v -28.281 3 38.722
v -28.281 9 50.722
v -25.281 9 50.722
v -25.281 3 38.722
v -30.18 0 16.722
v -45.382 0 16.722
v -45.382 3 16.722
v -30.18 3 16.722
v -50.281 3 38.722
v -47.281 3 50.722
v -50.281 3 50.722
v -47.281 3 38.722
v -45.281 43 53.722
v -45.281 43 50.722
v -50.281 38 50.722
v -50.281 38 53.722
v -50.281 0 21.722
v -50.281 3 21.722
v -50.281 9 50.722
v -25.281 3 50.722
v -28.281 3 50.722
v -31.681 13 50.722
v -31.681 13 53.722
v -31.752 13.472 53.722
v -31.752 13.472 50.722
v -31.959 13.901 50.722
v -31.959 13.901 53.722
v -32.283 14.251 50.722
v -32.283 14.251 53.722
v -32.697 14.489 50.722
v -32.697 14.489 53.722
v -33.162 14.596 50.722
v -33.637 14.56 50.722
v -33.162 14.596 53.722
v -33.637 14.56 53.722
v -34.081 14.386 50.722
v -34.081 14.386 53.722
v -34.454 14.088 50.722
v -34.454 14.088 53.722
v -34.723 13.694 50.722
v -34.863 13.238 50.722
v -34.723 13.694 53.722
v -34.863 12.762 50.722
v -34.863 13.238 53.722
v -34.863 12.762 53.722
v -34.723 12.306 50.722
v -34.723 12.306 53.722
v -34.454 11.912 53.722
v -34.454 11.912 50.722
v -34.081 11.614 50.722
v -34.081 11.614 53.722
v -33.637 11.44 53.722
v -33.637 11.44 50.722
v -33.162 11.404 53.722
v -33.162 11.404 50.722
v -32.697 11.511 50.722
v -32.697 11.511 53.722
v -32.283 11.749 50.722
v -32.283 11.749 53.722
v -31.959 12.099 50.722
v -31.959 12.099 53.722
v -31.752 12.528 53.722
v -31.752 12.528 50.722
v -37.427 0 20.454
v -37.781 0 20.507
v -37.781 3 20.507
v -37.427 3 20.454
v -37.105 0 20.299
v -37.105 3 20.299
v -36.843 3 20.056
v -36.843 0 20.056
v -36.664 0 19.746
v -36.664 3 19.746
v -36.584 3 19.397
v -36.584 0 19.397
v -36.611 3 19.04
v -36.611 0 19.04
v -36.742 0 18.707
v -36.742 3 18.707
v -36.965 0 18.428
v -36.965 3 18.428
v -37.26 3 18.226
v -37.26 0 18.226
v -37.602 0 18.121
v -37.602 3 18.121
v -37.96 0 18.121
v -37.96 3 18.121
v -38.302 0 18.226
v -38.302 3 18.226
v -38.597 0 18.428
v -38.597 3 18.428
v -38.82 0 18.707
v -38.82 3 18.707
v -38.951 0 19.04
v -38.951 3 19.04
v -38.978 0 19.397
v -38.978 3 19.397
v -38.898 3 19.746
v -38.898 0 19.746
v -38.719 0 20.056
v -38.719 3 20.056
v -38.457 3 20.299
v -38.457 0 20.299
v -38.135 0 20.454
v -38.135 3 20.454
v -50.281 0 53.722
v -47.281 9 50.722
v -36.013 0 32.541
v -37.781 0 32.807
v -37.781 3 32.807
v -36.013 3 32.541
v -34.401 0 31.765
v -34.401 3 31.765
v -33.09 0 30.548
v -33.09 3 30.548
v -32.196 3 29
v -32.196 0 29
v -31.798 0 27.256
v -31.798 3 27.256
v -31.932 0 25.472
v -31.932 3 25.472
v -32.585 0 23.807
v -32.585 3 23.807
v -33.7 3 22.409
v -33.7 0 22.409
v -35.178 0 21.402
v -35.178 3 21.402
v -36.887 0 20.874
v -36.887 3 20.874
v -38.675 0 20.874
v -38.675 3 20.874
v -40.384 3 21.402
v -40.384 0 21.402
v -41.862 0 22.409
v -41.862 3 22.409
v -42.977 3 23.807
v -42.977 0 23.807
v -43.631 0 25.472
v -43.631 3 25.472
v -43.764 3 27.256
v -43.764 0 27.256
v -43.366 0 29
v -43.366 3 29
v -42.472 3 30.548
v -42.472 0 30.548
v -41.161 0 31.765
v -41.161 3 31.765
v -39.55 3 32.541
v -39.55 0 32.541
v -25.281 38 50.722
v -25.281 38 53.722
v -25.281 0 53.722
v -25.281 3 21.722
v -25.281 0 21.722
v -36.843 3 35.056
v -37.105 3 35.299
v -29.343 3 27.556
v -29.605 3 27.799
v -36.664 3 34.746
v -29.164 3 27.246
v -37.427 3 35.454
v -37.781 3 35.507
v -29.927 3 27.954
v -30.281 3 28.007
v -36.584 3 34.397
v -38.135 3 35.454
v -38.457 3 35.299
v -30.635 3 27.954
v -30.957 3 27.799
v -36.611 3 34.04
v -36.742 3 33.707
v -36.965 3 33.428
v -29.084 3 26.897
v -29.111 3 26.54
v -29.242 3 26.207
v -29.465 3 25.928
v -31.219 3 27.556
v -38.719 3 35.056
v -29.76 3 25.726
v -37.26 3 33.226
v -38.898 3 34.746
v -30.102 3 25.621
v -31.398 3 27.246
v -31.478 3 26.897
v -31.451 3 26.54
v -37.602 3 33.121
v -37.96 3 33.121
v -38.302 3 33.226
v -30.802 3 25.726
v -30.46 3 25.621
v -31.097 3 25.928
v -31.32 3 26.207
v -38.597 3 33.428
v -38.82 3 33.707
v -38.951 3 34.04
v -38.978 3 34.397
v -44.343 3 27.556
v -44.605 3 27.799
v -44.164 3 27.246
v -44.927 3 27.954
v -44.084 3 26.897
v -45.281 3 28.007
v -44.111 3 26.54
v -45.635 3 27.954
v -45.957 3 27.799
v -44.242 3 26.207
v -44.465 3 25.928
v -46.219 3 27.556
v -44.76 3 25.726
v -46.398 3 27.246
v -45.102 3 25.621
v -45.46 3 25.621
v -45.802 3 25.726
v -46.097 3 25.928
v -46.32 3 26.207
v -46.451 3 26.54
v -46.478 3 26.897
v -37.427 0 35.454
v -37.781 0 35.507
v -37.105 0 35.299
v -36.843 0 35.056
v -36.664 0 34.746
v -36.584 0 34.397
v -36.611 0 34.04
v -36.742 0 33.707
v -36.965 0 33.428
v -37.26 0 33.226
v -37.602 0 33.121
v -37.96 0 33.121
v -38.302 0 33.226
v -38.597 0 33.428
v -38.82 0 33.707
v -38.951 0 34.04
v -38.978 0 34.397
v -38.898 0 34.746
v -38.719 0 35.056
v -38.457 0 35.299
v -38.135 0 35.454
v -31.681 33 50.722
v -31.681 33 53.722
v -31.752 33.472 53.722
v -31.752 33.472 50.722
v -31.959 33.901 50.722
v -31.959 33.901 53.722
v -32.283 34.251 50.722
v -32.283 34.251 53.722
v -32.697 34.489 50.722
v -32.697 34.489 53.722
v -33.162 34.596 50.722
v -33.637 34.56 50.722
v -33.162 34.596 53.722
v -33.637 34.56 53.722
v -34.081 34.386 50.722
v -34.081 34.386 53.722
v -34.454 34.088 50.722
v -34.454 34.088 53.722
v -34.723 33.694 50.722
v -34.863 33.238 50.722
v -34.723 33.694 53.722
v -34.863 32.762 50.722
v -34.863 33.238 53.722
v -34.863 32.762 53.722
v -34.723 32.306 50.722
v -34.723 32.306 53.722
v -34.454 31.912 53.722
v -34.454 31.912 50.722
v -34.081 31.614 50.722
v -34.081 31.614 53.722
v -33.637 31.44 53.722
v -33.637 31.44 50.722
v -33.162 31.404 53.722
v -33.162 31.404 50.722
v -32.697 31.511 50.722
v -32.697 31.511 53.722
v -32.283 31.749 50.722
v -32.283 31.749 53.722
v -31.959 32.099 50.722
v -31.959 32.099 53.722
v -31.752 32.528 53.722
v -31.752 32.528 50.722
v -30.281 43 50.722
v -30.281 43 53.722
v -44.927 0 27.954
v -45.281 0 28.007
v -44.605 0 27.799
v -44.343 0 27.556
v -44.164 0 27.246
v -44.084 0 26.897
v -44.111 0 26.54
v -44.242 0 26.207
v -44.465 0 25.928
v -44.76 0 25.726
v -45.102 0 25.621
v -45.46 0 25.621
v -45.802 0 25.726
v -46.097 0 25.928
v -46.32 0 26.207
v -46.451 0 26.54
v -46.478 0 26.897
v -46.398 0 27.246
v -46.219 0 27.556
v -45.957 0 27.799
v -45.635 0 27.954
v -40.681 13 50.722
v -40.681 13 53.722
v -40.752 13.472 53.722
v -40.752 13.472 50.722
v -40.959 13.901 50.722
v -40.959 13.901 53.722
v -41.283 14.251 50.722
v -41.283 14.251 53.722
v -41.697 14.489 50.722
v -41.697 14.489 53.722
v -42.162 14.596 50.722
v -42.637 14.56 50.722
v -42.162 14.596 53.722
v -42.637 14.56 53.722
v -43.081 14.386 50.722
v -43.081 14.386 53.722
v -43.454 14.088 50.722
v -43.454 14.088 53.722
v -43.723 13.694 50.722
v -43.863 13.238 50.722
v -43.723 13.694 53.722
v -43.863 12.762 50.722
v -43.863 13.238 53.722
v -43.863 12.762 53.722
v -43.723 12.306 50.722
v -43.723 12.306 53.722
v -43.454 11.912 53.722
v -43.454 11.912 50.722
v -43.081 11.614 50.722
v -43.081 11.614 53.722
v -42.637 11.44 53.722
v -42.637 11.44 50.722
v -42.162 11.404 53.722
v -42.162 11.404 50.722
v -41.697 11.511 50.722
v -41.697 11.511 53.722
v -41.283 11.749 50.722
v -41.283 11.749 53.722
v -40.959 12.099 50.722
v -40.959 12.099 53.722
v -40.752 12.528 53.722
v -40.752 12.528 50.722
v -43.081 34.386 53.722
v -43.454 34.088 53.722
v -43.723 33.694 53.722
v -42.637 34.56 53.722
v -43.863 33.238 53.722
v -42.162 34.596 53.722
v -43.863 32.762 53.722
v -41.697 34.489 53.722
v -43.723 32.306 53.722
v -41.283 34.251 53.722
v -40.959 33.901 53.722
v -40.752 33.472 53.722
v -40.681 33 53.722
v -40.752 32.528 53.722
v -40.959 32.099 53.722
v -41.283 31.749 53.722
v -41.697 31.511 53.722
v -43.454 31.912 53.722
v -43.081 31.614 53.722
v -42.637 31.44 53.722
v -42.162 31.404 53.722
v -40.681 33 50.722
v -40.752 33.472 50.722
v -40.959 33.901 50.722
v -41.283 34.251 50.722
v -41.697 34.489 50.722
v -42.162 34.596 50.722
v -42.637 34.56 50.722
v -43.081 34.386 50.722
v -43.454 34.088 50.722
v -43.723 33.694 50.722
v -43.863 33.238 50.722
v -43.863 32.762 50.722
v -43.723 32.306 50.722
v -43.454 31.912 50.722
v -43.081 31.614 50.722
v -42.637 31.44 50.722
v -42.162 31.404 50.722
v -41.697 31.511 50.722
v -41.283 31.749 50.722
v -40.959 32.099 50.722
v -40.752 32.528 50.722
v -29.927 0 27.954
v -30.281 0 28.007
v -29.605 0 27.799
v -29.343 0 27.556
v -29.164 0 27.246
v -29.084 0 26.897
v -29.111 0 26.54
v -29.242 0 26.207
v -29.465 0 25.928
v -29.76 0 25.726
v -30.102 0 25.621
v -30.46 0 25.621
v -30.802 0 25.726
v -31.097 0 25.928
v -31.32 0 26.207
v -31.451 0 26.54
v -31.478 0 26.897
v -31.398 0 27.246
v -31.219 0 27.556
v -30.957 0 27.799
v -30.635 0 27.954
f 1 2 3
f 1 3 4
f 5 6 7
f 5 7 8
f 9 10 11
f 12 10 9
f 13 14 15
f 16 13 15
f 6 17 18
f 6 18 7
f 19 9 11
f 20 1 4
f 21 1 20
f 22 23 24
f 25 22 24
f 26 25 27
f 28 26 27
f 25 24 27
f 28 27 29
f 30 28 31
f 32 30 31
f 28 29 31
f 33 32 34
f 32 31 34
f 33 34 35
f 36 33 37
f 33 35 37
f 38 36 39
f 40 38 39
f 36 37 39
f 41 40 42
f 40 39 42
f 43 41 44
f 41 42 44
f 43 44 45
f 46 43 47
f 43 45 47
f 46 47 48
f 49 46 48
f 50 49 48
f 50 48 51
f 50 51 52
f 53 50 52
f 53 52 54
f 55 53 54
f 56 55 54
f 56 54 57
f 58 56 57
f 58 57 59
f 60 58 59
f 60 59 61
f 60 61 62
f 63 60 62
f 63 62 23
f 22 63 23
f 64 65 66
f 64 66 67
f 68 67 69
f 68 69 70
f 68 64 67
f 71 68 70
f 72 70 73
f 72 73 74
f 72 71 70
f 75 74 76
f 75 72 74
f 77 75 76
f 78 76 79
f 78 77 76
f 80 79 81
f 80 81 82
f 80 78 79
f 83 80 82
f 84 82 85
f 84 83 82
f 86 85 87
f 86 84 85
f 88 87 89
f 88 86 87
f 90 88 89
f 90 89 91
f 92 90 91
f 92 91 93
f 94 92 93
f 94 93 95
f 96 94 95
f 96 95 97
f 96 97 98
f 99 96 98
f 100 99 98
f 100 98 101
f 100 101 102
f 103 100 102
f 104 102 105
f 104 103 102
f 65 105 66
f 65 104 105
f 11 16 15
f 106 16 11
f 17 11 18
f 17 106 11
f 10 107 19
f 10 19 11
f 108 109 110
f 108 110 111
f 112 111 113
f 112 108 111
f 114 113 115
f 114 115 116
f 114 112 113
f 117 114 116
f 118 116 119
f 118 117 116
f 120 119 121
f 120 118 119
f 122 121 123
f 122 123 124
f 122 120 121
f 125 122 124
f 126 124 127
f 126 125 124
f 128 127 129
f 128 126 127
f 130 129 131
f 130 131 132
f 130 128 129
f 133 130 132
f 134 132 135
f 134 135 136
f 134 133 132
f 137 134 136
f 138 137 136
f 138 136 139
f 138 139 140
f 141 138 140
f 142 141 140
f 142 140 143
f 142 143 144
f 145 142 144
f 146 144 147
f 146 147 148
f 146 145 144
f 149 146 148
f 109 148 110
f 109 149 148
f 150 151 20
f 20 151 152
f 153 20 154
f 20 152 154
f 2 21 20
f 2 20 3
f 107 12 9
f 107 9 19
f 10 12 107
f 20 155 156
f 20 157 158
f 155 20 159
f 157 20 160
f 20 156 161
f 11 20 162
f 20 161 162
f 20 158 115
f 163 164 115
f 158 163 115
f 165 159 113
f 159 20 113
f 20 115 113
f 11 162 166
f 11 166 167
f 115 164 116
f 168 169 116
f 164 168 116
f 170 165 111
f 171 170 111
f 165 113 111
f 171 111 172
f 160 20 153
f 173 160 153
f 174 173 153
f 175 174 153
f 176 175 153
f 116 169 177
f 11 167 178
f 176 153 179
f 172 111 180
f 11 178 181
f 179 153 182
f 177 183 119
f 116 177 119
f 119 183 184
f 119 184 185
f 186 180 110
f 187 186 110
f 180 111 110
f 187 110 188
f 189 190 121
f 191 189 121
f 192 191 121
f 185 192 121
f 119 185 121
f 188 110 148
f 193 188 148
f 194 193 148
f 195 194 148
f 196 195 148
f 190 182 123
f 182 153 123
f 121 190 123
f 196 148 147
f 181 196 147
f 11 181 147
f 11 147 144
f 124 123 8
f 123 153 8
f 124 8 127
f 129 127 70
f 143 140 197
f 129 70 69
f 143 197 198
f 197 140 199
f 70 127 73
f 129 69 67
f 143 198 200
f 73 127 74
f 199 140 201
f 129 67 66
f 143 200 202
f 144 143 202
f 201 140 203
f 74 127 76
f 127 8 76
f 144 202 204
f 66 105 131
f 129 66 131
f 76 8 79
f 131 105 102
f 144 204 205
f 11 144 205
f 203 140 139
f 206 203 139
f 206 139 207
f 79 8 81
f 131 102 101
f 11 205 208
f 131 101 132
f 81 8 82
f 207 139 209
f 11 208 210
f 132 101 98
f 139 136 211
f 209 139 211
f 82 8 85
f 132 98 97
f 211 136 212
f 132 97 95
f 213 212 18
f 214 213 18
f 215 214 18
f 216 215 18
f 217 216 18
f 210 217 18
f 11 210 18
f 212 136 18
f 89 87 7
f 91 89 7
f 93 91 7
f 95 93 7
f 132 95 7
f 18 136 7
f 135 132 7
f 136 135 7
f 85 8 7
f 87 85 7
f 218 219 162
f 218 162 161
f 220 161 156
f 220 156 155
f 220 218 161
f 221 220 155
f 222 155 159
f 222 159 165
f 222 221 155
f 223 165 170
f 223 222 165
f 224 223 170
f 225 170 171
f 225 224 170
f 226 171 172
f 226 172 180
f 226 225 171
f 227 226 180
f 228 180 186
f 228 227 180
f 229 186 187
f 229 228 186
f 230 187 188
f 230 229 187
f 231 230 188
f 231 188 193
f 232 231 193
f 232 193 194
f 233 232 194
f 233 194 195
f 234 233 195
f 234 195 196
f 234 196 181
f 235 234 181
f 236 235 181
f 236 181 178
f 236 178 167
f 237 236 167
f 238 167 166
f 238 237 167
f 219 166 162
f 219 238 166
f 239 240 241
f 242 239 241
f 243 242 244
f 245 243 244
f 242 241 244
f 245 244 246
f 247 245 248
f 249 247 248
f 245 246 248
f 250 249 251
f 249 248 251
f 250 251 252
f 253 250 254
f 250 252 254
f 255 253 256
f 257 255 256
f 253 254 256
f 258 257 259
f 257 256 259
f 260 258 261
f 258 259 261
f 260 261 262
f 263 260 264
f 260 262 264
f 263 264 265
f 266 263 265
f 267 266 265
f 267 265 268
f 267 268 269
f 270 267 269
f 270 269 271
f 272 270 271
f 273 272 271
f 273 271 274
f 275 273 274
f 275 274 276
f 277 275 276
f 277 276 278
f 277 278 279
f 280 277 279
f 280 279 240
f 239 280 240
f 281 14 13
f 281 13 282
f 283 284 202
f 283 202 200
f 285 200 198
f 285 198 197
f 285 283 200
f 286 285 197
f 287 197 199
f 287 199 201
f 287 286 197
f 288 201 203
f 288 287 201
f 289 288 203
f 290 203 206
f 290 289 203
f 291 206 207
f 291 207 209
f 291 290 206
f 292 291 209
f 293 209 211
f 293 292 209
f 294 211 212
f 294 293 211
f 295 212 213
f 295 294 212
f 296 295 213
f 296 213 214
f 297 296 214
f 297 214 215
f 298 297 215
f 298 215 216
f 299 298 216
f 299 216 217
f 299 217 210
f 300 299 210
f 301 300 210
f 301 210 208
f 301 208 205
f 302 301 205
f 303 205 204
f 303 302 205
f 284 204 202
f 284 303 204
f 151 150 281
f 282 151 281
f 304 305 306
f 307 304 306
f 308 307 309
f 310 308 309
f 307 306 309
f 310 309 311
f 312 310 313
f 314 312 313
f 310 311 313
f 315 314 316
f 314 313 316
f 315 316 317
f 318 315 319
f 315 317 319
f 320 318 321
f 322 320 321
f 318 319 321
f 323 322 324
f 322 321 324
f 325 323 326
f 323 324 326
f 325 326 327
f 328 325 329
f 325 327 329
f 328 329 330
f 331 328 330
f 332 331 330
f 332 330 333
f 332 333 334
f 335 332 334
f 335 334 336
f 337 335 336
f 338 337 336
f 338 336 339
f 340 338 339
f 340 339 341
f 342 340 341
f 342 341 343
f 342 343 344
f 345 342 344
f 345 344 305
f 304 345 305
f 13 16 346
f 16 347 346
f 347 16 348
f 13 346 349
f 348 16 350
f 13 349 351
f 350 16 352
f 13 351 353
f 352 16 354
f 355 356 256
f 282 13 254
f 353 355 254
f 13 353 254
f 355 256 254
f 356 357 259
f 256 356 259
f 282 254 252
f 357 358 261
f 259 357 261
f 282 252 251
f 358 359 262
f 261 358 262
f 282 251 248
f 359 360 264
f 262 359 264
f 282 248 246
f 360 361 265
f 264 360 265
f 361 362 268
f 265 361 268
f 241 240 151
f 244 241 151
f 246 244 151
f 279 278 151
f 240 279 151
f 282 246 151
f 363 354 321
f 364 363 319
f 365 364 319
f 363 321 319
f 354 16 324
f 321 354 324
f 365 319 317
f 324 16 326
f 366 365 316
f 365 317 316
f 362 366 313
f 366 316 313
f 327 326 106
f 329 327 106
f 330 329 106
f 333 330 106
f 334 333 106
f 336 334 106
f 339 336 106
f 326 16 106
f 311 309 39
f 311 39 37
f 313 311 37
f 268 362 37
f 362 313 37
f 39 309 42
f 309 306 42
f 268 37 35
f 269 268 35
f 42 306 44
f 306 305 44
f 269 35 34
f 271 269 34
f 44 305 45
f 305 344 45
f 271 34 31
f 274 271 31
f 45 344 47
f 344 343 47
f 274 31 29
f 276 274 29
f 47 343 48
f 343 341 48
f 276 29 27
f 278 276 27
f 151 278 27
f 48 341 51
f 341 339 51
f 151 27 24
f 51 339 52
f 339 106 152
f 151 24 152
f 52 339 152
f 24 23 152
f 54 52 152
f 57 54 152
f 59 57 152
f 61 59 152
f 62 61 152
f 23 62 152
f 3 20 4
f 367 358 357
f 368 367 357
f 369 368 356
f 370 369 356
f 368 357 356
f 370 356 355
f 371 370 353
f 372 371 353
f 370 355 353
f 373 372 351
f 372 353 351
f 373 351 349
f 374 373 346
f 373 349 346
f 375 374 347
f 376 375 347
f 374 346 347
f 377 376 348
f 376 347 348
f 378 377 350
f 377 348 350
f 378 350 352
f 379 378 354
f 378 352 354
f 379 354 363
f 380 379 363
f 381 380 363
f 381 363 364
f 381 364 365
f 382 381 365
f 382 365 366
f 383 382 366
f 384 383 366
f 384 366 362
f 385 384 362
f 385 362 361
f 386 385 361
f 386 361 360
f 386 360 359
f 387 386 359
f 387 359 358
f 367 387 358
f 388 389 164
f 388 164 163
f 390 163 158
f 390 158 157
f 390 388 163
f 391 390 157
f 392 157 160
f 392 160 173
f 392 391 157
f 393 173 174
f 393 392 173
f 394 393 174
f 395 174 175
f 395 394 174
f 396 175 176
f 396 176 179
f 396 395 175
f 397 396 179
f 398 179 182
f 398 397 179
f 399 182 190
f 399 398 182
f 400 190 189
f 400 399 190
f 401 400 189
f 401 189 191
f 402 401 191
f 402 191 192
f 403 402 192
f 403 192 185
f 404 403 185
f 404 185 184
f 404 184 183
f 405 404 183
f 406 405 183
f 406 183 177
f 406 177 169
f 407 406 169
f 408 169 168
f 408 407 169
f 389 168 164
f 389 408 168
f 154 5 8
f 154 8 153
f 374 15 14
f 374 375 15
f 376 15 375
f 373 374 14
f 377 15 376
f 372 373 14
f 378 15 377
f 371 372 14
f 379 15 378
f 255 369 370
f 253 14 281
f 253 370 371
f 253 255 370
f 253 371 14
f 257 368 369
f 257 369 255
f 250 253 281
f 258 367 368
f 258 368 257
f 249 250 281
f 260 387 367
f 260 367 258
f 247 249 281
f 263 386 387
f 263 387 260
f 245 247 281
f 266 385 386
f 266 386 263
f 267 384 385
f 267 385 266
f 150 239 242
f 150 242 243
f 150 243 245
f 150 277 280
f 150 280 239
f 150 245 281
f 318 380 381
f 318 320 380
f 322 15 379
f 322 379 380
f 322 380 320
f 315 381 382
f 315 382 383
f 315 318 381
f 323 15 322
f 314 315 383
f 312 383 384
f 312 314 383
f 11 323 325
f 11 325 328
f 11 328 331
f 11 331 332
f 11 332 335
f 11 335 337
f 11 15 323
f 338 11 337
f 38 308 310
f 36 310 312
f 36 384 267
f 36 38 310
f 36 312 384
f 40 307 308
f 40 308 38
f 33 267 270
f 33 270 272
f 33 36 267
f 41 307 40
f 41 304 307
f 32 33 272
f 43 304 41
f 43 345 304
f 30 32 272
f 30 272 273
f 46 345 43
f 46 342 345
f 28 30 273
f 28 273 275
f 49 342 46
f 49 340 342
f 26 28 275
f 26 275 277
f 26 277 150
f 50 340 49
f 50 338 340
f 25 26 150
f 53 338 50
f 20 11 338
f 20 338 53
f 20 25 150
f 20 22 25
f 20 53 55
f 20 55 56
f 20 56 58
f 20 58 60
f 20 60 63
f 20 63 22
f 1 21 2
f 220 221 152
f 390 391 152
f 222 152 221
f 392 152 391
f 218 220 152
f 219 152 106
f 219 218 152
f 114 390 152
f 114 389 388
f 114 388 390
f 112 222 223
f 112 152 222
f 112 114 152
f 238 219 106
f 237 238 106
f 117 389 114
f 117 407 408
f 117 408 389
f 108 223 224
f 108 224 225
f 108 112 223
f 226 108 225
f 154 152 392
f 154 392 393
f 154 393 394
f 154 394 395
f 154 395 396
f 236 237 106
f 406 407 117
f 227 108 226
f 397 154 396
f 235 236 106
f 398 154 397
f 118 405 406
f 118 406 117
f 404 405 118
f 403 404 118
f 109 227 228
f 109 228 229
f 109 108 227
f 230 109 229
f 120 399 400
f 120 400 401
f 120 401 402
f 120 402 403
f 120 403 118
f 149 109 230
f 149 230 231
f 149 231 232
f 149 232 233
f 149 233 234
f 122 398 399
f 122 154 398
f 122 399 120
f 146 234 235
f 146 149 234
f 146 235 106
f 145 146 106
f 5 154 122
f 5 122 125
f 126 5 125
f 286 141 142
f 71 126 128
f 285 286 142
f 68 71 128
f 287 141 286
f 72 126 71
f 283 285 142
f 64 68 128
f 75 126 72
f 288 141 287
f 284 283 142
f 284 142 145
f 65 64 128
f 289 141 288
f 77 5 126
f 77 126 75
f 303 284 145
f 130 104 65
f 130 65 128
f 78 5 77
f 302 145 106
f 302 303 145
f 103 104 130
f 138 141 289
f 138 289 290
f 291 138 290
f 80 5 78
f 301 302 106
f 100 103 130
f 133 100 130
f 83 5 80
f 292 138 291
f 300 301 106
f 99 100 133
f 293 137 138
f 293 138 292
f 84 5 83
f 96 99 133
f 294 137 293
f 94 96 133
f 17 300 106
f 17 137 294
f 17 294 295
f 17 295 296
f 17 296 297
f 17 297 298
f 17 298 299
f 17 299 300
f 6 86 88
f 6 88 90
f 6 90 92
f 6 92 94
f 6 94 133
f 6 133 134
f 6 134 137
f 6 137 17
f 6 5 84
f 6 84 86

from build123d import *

# Parameters (mm, degrees)
SKETCH2_R                      = 6
SKETCH2_R_2                    = 1.2
BOSS_EXTRUDE1_DEPTH            = 3
SKETCH4_W                      = 25
SKETCH4_H                      = 3
BOSS_EXTRUDE2_DEPTH            = 40
CUT_EXTRUDE1_DEPTH             = 8
F_3_2_3_2_DIAMETER_HOLE1_D     = 3.2
F_3_2_3_2_DIAMETER_HOLE1_DEPTH = 3.2
F_3_2_3_2_DIAMETER_HOLE1_TIP   = 0.96137699
GUSSET1_THICKNESS              = 3
GUSSET2_THICKNESS              = 3


with BuildPart() as part:
    # Sketch2 → Boss-Extrude1 (new body)
    with BuildSketch(Plane(origin=(0, 0, 0), x_dir=(1, 0, 0), z_dir=(0, 1, 0))):
        Polygon((-25.281070854, -53.721991781), (-50.281070854, -53.721991781), (-50.281070854, -21.721991781), (-45.382091368, -16.721991781), (-30.180050339, -16.721991781), (-25.281070854, -21.721991781), align=None)
        with Locations(Location((-37.781070854, -26.807484951, 0), (0, 0, 270))):
            Circle(SKETCH2_R, mode=Mode.SUBTRACT)
        with Locations(Location((-37.781070854, -19.307484951, 0), (0, 0, 270))):
            Circle(SKETCH2_R_2, mode=Mode.SUBTRACT)
        with Locations(Location((-45.281070854, -26.807484951, 0), (0, 0, 270))):
            Circle(SKETCH2_R_2, mode=Mode.SUBTRACT)
        with Locations(Location((-37.781070854, -34.307484951, 0), (0, 0, 270))):
            Circle(SKETCH2_R_2, mode=Mode.SUBTRACT)
        with Locations(Location((-30.281070854, -26.807484951, 0), (0, 0, 270))):
            Circle(SKETCH2_R_2, mode=Mode.SUBTRACT)
    extrude(amount=BOSS_EXTRUDE1_DEPTH)

    # Sketch4 → Boss-Extrude2 (add)
    with BuildSketch(Plane(origin=(0, 3, 0), x_dir=(1, 0, 0), z_dir=(0, 1, 0))):
        with Locations((-37.781070854, -52.221991781)):
            Rectangle(SKETCH4_W, SKETCH4_H)
    extrude(amount=BOSS_EXTRUDE2_DEPTH)

    # Sketch5 → Cut-Extrude1 (cut)
    with BuildSketch(Plane(origin=(0, 0, 50.721991781), x_dir=(-1, 0, 0), z_dir=(0, 0, -1))):
        Polygon((25.281070854, 43), (25.281070854, 38), (30.281070854, 43), align=None)
        Polygon((50.281070854, 43), (45.281070854, 43), (50.281070854, 38), align=None)
    extrude(amount=-CUT_EXTRUDE1_DEPTH, mode=Mode.SUBTRACT)

    # Ø3.2 (3.2) Diameter Hole1
    with Locations(Plane(origin=(0, 0, 50.721991781), x_dir=(-1, 0, 0), z_dir=(0, 0, -1))):
        with Locations((33.281070854, 33), (42.281070854, 33), (42.281070854, 13), (33.281070854, 13)):
            Hole(F_3_2_3_2_DIAMETER_HOLE1_D / 2, depth=F_3_2_3_2_DIAMETER_HOLE1_DEPTH)
            with Locations((0, 0, -(F_3_2_3_2_DIAMETER_HOLE1_DEPTH + F_3_2_3_2_DIAMETER_HOLE1_TIP / 2))):  # 118° drill point
                Cone(0, F_3_2_3_2_DIAMETER_HOLE1_D / 2, F_3_2_3_2_DIAMETER_HOLE1_TIP, mode=Mode.SUBTRACT)


with BuildPart() as body_2:
    # Gusset1: a gusset: a plate 3.0 thick in the corner of two members, its outline drawn in place
    gusset1_outline = Wire([Line((-47.281070854, 3, 50.721991781), (-47.281070854, 3, 38.721991781)), Line((-47.281070854, 3, 38.721991781), (-47.281070854, 9, 50.721991781)), Line((-47.281070854, 9, 50.721991781), (-47.281070854, 3, 50.721991781))])
    add(extrude(Face(gusset1_outline), amount=GUSSET1_THICKNESS, dir=(-1, 0, 0)))


with BuildPart() as body_3:
    # Gusset2: a gusset: a plate 3.0 thick in the corner of two members, its outline drawn in place
    gusset2_outline = Wire([Line((-28.281070854, 3, 50.721991781), (-28.281070854, 9, 50.721991781)), Line((-28.281070854, 9, 50.721991781), (-28.281070854, 3, 38.721991781)), Line((-28.281070854, 3, 38.721991781), (-28.281070854, 3, 50.721991781))])
    add(extrude(Face(gusset2_outline), amount=GUSSET2_THICKNESS, dir=(1, 0, 0)))


solid = Compound([part.part, body_2.part, body_3.part])
